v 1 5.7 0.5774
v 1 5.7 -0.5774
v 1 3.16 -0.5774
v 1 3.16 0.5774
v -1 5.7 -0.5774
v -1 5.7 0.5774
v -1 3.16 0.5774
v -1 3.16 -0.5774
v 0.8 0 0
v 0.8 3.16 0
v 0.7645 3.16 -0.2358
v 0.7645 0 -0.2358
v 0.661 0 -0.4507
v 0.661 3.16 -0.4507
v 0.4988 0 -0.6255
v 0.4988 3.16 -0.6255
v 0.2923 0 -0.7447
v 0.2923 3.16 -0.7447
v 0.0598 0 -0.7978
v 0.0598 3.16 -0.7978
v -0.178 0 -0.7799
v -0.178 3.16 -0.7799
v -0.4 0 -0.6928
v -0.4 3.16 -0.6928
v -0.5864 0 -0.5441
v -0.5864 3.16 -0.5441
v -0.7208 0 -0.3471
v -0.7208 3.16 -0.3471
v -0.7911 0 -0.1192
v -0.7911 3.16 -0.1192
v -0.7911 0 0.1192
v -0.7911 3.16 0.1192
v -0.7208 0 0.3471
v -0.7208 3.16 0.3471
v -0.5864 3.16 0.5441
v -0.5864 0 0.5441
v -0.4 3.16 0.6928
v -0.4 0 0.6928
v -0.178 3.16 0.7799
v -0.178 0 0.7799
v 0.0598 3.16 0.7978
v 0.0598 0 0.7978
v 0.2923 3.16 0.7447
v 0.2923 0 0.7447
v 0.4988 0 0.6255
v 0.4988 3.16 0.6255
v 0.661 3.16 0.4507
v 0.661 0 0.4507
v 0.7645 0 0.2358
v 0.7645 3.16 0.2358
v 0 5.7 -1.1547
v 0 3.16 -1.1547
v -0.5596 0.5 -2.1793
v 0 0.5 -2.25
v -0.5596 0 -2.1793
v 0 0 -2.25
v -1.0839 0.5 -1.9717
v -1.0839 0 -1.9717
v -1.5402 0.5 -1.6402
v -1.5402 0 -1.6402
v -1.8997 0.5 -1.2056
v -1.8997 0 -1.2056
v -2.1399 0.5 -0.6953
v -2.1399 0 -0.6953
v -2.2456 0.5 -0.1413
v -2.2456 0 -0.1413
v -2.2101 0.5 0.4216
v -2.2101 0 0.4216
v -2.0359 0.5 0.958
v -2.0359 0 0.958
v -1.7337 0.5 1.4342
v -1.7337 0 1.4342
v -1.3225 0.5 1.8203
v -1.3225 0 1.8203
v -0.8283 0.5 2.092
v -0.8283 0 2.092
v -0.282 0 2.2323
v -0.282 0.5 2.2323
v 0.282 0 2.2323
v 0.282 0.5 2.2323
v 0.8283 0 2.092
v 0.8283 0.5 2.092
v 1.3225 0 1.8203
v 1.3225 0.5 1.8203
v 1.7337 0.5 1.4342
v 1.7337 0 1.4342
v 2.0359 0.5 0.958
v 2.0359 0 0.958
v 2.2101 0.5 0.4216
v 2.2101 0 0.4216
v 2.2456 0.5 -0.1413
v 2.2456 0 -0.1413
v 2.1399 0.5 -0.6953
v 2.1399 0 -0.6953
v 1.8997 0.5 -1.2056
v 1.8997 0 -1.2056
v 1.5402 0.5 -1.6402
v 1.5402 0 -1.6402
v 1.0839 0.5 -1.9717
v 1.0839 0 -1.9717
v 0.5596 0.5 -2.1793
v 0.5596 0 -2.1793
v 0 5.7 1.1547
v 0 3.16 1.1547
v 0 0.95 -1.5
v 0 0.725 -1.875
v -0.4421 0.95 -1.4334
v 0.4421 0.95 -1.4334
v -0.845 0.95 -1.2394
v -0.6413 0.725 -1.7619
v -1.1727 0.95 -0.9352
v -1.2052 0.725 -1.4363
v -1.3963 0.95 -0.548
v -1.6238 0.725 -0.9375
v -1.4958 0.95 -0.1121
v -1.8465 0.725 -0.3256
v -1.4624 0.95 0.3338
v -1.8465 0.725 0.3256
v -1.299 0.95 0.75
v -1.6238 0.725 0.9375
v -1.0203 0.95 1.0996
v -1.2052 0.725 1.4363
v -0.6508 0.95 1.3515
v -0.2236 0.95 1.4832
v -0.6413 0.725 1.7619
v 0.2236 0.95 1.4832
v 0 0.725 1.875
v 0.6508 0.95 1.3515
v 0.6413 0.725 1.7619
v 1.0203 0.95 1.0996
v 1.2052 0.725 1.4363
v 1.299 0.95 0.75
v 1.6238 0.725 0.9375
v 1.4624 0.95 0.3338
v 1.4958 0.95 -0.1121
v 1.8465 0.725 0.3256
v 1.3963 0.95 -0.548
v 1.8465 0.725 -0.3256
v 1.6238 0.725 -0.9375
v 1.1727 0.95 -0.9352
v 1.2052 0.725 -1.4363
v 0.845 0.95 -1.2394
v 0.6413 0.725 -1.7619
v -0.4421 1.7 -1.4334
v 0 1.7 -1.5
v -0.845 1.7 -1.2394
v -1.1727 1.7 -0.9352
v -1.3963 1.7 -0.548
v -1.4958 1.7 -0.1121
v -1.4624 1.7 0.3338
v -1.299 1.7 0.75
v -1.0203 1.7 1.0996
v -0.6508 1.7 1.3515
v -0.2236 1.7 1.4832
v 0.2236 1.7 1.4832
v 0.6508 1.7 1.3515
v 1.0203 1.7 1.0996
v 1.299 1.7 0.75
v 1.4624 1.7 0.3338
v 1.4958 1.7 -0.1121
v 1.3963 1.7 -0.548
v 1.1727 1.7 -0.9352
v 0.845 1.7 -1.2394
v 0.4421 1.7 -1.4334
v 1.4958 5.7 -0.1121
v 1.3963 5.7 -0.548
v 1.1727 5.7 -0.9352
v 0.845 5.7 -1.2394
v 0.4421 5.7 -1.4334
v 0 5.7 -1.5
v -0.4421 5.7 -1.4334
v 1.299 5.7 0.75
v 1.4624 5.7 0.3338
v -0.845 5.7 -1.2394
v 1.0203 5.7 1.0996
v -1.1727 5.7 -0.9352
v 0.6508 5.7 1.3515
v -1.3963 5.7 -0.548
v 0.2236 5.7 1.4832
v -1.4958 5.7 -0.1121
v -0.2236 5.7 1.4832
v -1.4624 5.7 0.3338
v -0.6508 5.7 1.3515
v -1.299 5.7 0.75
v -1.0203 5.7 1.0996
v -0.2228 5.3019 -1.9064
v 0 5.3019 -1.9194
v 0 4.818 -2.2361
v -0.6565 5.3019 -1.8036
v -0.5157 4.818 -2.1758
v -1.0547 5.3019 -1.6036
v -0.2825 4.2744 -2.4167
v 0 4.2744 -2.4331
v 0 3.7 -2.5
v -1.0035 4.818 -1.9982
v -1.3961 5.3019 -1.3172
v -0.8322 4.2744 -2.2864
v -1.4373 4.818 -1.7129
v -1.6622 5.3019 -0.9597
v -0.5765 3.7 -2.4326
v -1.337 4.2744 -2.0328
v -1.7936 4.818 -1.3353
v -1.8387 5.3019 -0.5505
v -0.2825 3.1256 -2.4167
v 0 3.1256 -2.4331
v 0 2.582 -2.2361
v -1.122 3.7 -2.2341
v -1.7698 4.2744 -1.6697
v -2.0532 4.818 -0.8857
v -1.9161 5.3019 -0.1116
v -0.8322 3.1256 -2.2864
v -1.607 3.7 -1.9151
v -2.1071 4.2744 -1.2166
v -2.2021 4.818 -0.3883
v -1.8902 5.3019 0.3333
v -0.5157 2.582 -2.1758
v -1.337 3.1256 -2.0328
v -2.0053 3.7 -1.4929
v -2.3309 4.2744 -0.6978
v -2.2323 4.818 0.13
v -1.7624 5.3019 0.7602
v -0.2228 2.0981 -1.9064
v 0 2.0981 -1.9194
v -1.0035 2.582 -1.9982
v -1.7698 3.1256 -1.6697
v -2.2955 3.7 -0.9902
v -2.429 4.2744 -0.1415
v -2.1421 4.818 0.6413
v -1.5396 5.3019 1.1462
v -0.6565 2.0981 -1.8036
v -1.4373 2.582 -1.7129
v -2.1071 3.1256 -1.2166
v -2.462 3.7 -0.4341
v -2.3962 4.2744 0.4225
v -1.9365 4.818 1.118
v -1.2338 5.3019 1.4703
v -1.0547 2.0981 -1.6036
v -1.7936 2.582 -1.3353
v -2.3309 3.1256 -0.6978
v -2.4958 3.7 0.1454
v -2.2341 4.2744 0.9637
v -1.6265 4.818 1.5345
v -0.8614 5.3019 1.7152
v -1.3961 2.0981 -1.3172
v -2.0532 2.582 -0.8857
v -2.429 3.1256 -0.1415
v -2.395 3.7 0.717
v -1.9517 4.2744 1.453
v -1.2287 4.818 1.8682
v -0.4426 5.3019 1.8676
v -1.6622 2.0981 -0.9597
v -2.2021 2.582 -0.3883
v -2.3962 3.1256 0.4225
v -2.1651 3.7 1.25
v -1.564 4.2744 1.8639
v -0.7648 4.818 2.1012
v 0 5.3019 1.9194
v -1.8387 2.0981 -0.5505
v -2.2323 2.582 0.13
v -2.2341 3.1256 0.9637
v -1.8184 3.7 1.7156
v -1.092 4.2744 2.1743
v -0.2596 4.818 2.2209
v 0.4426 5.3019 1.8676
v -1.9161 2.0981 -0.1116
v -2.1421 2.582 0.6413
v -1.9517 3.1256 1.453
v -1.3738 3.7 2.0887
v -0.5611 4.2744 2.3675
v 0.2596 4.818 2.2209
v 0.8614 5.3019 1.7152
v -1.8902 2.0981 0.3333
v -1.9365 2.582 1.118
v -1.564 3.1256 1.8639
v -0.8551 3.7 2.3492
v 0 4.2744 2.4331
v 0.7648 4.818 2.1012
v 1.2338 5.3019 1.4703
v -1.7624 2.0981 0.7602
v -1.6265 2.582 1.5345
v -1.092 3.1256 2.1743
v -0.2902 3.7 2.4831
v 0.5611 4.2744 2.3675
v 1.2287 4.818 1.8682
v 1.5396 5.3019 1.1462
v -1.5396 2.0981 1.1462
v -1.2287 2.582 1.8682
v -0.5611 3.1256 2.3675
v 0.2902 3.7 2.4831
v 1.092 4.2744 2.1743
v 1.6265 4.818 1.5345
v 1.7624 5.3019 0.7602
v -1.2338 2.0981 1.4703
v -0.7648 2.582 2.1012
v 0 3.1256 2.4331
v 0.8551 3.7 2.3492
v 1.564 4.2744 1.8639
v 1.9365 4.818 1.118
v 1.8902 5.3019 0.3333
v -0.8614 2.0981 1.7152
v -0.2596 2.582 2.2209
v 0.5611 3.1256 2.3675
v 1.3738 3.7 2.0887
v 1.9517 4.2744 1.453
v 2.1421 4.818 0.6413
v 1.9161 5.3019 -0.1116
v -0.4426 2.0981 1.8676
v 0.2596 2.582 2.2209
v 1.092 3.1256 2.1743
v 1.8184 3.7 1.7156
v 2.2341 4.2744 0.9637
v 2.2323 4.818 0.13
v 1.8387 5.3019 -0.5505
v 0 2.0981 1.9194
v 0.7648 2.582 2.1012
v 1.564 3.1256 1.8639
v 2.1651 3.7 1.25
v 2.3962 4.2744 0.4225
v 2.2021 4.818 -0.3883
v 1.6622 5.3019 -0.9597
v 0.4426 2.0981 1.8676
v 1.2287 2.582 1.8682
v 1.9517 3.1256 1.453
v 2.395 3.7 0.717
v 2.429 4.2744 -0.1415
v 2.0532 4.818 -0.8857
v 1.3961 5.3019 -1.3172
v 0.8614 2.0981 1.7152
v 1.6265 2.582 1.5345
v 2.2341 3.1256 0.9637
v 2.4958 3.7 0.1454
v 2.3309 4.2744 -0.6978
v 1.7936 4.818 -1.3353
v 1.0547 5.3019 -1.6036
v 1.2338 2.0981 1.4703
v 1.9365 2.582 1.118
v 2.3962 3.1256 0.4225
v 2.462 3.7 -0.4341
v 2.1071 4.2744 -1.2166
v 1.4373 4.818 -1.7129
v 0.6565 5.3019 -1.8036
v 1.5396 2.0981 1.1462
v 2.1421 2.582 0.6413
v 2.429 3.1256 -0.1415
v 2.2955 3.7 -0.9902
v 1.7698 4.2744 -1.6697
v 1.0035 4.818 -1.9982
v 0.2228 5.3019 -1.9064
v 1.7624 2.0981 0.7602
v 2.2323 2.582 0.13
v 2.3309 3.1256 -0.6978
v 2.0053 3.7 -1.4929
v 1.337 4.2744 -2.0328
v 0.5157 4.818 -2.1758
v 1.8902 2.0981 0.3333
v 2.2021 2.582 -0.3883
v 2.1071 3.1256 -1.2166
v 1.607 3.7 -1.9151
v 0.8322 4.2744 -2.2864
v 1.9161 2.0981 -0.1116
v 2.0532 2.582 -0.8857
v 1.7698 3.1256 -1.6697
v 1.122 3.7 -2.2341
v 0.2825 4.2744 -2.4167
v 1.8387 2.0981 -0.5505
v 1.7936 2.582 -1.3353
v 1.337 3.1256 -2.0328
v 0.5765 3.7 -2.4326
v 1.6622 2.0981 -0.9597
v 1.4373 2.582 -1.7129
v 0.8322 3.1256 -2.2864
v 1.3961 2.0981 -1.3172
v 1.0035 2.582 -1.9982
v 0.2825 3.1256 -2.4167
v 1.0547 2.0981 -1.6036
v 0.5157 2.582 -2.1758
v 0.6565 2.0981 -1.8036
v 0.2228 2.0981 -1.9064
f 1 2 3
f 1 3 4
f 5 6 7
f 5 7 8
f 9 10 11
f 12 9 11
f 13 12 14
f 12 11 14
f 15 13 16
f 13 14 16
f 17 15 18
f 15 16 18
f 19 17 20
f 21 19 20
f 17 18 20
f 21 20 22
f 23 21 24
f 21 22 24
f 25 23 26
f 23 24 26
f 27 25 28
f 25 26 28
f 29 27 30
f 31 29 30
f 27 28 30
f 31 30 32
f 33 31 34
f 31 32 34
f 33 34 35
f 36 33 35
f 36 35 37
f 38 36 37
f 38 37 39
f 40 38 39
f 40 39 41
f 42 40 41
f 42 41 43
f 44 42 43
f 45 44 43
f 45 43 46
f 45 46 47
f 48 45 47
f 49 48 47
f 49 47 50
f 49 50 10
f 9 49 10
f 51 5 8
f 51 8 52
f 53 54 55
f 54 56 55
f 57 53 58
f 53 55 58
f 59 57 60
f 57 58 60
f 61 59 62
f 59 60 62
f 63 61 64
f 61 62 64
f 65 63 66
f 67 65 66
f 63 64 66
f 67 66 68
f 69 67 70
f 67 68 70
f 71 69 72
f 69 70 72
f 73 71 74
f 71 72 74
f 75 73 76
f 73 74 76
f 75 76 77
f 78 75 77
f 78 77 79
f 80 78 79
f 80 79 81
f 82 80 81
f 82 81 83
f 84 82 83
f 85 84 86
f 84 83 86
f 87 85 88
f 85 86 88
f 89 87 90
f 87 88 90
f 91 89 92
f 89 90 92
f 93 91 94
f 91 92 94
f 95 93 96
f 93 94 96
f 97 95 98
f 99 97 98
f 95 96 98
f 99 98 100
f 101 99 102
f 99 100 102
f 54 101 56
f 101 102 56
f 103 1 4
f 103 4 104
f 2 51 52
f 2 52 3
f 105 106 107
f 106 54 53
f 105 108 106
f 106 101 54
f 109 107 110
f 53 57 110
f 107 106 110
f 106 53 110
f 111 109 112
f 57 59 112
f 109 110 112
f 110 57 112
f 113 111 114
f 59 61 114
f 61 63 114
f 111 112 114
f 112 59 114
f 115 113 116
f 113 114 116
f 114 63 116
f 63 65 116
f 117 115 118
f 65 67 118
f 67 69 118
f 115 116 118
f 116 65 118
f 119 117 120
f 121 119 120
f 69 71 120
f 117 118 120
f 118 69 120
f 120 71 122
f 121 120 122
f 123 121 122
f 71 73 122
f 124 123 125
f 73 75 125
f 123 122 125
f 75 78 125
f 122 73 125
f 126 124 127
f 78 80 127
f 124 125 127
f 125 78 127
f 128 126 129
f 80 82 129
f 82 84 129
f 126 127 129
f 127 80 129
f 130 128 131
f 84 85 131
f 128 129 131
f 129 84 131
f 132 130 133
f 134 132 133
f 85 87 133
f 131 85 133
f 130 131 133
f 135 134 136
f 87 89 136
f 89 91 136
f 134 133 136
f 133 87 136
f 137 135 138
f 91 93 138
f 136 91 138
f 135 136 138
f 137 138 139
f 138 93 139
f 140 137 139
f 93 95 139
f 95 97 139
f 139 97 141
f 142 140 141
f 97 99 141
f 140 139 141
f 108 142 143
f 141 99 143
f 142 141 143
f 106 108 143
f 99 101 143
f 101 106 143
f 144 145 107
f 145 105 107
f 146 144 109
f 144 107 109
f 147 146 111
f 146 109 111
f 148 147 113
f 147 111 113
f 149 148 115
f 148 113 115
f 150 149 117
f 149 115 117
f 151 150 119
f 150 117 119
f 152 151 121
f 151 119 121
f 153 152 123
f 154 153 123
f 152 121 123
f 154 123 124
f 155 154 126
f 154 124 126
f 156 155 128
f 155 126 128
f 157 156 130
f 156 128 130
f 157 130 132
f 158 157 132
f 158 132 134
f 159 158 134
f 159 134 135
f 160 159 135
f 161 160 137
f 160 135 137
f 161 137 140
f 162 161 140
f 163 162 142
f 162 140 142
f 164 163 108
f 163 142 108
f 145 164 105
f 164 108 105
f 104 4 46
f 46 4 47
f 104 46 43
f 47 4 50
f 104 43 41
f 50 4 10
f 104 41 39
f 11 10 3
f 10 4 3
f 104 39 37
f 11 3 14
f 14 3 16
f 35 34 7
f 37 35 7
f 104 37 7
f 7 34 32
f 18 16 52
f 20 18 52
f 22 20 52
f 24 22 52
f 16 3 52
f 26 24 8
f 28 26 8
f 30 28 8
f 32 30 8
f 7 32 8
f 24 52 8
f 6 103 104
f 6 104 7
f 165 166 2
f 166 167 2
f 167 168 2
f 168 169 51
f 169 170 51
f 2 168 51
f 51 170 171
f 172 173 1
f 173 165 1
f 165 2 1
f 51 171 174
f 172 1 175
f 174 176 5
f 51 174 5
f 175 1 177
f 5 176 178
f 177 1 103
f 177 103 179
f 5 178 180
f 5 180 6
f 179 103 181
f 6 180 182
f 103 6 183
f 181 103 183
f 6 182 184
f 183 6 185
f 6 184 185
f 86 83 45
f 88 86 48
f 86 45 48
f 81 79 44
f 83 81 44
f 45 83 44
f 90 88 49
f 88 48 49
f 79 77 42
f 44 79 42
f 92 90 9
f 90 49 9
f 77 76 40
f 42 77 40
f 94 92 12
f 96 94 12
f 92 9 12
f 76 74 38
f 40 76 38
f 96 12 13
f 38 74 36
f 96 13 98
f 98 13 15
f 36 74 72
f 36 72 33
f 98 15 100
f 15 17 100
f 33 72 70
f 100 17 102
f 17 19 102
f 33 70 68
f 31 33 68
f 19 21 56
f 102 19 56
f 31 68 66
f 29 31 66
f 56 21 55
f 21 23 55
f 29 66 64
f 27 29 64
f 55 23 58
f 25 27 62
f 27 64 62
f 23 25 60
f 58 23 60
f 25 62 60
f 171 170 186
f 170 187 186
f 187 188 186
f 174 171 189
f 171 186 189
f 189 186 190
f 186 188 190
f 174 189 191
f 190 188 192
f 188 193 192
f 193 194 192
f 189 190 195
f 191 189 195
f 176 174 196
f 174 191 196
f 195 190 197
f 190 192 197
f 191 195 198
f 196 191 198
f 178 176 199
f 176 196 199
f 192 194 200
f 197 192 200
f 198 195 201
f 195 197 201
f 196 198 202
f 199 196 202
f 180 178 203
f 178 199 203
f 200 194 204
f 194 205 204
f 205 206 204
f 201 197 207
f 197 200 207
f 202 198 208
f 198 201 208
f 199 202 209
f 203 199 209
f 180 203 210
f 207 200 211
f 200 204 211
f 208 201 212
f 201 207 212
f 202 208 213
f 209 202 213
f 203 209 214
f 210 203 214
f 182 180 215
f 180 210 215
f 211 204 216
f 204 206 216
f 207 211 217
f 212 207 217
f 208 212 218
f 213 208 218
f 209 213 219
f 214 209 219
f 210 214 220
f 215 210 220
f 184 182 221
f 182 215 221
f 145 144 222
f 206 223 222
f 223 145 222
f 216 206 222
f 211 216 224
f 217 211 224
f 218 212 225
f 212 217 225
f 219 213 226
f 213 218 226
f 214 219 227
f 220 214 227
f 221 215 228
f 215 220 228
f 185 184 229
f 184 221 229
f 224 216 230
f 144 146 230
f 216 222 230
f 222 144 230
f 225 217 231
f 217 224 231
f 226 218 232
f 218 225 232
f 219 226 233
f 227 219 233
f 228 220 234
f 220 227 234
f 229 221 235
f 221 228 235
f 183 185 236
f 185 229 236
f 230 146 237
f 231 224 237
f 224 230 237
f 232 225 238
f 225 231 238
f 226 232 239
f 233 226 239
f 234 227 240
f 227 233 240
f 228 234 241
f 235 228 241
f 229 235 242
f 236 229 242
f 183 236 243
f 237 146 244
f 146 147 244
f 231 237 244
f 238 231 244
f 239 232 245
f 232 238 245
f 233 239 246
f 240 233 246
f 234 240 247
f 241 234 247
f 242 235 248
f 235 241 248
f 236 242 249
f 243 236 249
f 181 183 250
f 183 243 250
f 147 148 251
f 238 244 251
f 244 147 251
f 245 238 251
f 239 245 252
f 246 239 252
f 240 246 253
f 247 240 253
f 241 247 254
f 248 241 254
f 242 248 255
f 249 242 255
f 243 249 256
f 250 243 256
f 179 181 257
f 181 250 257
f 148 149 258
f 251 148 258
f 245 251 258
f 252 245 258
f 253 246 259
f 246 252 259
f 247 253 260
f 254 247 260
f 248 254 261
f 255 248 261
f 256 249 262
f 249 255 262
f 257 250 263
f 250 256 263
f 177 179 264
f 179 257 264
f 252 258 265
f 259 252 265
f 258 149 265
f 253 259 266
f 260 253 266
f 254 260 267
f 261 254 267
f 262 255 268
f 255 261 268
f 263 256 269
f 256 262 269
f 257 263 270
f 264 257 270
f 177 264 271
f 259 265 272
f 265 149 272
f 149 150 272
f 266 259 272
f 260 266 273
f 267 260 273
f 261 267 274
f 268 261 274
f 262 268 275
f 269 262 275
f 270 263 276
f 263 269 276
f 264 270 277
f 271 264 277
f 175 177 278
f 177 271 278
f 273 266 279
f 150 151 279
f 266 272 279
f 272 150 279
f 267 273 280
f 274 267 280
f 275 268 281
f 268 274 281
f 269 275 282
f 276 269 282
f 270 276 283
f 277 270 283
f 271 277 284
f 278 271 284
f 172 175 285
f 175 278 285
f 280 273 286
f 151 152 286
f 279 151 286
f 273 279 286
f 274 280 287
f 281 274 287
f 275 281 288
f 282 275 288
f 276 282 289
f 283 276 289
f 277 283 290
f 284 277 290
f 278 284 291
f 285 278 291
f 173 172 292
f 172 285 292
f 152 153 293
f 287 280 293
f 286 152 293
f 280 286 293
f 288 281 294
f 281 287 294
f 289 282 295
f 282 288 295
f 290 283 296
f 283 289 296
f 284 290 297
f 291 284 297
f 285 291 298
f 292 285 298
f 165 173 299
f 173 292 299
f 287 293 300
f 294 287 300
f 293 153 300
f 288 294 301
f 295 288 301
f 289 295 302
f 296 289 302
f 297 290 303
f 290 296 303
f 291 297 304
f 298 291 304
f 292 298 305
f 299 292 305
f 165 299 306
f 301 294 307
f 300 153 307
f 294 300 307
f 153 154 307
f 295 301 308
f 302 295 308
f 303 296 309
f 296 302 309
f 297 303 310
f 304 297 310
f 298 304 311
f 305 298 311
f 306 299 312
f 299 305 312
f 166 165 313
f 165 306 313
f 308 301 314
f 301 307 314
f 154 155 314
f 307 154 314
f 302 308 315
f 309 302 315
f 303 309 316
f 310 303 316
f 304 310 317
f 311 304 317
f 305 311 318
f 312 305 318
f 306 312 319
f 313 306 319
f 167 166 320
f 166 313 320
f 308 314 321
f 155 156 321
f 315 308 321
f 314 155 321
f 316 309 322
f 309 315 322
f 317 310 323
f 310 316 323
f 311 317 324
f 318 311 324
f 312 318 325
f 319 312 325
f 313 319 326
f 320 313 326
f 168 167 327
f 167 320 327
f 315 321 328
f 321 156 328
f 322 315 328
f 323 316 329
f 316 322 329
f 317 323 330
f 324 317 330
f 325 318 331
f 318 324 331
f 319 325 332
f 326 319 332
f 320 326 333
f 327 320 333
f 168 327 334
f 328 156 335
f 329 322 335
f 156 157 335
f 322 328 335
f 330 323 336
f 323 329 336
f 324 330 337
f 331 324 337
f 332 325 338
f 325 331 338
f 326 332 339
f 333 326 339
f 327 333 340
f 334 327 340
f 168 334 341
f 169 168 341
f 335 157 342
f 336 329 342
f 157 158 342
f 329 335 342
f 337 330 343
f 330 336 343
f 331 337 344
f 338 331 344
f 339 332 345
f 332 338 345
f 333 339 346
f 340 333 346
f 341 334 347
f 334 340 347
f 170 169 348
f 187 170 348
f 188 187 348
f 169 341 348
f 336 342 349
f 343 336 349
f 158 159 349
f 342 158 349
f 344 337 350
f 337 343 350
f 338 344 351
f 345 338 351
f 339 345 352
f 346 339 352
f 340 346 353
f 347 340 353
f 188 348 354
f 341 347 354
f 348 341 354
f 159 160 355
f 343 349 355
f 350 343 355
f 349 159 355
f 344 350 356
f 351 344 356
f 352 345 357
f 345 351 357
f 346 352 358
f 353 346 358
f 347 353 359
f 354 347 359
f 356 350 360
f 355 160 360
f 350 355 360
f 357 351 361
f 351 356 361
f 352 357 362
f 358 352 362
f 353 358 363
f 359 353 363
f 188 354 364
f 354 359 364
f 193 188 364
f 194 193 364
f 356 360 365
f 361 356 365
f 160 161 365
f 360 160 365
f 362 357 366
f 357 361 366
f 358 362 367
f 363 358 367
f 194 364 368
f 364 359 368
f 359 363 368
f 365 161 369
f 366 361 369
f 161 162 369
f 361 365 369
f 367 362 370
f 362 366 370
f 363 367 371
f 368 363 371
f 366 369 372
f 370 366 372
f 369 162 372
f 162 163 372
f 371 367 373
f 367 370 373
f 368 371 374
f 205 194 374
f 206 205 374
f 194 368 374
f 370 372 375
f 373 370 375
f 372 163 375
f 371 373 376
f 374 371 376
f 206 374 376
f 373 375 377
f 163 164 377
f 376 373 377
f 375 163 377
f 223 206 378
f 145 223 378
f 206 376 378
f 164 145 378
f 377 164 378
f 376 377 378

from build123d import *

# Parameters (mm, degrees)
CUT_EXTRUDE1_DEPTH = 2.54
M2_TAPPED_HOLE1_D  = 1.6


with BuildPart() as part:
    # Sketch1 → Revolve1 (revolve)
    with BuildSketch(Plane.XY, mode=Mode.PRIVATE) as revolve1_sk:
        with BuildLine():
            Line((0, 0), (0, 5.7))
            Line((0, 5.7), (-1.5, 5.7))
            ThreePointArc((-1.5, 5.7), (-2.5, 3.7), (-1.5, 1.7))
            Line((-1.5, 1.7), (-1.5, 0.95))
            Line((-1.5, 0.95), (-2.25, 0.5))
            Line((-2.25, 0.5), (-2.25, 0))
            Line((-2.25, 0), (0, 0))
        make_face()
    revolve(revolve1_sk.sketch.rotate(Axis((0, 0, 0), (0, 1, 0)), 270), axis=Axis((0, 0, 0), (0, 1, 0)))

    # Sketch2 → Cut-Extrude1 (cut)
    with BuildSketch(Plane(origin=(0, 5.7, 0), x_dir=(1, 0, 0), z_dir=(0, 1, 0))):
        Polygon((-1, -0.577350269), (-1, 0.577350269), (0, 1.154700538), (1, 0.577350269), (1, -0.577350269), (0, -1.154700538), align=None)
    extrude(amount=-CUT_EXTRUDE1_DEPTH, mode=Mode.SUBTRACT)

    # M2 Tapped Hole1 (through all)
    with Locations(Plane(origin=(0, 0, 0), x_dir=(-1, 0, 0), z_dir=(0, -1, 0))):
        with Locations((0, 0)):
            Hole(M2_TAPPED_HOLE1_D / 2)


solid = part.part
